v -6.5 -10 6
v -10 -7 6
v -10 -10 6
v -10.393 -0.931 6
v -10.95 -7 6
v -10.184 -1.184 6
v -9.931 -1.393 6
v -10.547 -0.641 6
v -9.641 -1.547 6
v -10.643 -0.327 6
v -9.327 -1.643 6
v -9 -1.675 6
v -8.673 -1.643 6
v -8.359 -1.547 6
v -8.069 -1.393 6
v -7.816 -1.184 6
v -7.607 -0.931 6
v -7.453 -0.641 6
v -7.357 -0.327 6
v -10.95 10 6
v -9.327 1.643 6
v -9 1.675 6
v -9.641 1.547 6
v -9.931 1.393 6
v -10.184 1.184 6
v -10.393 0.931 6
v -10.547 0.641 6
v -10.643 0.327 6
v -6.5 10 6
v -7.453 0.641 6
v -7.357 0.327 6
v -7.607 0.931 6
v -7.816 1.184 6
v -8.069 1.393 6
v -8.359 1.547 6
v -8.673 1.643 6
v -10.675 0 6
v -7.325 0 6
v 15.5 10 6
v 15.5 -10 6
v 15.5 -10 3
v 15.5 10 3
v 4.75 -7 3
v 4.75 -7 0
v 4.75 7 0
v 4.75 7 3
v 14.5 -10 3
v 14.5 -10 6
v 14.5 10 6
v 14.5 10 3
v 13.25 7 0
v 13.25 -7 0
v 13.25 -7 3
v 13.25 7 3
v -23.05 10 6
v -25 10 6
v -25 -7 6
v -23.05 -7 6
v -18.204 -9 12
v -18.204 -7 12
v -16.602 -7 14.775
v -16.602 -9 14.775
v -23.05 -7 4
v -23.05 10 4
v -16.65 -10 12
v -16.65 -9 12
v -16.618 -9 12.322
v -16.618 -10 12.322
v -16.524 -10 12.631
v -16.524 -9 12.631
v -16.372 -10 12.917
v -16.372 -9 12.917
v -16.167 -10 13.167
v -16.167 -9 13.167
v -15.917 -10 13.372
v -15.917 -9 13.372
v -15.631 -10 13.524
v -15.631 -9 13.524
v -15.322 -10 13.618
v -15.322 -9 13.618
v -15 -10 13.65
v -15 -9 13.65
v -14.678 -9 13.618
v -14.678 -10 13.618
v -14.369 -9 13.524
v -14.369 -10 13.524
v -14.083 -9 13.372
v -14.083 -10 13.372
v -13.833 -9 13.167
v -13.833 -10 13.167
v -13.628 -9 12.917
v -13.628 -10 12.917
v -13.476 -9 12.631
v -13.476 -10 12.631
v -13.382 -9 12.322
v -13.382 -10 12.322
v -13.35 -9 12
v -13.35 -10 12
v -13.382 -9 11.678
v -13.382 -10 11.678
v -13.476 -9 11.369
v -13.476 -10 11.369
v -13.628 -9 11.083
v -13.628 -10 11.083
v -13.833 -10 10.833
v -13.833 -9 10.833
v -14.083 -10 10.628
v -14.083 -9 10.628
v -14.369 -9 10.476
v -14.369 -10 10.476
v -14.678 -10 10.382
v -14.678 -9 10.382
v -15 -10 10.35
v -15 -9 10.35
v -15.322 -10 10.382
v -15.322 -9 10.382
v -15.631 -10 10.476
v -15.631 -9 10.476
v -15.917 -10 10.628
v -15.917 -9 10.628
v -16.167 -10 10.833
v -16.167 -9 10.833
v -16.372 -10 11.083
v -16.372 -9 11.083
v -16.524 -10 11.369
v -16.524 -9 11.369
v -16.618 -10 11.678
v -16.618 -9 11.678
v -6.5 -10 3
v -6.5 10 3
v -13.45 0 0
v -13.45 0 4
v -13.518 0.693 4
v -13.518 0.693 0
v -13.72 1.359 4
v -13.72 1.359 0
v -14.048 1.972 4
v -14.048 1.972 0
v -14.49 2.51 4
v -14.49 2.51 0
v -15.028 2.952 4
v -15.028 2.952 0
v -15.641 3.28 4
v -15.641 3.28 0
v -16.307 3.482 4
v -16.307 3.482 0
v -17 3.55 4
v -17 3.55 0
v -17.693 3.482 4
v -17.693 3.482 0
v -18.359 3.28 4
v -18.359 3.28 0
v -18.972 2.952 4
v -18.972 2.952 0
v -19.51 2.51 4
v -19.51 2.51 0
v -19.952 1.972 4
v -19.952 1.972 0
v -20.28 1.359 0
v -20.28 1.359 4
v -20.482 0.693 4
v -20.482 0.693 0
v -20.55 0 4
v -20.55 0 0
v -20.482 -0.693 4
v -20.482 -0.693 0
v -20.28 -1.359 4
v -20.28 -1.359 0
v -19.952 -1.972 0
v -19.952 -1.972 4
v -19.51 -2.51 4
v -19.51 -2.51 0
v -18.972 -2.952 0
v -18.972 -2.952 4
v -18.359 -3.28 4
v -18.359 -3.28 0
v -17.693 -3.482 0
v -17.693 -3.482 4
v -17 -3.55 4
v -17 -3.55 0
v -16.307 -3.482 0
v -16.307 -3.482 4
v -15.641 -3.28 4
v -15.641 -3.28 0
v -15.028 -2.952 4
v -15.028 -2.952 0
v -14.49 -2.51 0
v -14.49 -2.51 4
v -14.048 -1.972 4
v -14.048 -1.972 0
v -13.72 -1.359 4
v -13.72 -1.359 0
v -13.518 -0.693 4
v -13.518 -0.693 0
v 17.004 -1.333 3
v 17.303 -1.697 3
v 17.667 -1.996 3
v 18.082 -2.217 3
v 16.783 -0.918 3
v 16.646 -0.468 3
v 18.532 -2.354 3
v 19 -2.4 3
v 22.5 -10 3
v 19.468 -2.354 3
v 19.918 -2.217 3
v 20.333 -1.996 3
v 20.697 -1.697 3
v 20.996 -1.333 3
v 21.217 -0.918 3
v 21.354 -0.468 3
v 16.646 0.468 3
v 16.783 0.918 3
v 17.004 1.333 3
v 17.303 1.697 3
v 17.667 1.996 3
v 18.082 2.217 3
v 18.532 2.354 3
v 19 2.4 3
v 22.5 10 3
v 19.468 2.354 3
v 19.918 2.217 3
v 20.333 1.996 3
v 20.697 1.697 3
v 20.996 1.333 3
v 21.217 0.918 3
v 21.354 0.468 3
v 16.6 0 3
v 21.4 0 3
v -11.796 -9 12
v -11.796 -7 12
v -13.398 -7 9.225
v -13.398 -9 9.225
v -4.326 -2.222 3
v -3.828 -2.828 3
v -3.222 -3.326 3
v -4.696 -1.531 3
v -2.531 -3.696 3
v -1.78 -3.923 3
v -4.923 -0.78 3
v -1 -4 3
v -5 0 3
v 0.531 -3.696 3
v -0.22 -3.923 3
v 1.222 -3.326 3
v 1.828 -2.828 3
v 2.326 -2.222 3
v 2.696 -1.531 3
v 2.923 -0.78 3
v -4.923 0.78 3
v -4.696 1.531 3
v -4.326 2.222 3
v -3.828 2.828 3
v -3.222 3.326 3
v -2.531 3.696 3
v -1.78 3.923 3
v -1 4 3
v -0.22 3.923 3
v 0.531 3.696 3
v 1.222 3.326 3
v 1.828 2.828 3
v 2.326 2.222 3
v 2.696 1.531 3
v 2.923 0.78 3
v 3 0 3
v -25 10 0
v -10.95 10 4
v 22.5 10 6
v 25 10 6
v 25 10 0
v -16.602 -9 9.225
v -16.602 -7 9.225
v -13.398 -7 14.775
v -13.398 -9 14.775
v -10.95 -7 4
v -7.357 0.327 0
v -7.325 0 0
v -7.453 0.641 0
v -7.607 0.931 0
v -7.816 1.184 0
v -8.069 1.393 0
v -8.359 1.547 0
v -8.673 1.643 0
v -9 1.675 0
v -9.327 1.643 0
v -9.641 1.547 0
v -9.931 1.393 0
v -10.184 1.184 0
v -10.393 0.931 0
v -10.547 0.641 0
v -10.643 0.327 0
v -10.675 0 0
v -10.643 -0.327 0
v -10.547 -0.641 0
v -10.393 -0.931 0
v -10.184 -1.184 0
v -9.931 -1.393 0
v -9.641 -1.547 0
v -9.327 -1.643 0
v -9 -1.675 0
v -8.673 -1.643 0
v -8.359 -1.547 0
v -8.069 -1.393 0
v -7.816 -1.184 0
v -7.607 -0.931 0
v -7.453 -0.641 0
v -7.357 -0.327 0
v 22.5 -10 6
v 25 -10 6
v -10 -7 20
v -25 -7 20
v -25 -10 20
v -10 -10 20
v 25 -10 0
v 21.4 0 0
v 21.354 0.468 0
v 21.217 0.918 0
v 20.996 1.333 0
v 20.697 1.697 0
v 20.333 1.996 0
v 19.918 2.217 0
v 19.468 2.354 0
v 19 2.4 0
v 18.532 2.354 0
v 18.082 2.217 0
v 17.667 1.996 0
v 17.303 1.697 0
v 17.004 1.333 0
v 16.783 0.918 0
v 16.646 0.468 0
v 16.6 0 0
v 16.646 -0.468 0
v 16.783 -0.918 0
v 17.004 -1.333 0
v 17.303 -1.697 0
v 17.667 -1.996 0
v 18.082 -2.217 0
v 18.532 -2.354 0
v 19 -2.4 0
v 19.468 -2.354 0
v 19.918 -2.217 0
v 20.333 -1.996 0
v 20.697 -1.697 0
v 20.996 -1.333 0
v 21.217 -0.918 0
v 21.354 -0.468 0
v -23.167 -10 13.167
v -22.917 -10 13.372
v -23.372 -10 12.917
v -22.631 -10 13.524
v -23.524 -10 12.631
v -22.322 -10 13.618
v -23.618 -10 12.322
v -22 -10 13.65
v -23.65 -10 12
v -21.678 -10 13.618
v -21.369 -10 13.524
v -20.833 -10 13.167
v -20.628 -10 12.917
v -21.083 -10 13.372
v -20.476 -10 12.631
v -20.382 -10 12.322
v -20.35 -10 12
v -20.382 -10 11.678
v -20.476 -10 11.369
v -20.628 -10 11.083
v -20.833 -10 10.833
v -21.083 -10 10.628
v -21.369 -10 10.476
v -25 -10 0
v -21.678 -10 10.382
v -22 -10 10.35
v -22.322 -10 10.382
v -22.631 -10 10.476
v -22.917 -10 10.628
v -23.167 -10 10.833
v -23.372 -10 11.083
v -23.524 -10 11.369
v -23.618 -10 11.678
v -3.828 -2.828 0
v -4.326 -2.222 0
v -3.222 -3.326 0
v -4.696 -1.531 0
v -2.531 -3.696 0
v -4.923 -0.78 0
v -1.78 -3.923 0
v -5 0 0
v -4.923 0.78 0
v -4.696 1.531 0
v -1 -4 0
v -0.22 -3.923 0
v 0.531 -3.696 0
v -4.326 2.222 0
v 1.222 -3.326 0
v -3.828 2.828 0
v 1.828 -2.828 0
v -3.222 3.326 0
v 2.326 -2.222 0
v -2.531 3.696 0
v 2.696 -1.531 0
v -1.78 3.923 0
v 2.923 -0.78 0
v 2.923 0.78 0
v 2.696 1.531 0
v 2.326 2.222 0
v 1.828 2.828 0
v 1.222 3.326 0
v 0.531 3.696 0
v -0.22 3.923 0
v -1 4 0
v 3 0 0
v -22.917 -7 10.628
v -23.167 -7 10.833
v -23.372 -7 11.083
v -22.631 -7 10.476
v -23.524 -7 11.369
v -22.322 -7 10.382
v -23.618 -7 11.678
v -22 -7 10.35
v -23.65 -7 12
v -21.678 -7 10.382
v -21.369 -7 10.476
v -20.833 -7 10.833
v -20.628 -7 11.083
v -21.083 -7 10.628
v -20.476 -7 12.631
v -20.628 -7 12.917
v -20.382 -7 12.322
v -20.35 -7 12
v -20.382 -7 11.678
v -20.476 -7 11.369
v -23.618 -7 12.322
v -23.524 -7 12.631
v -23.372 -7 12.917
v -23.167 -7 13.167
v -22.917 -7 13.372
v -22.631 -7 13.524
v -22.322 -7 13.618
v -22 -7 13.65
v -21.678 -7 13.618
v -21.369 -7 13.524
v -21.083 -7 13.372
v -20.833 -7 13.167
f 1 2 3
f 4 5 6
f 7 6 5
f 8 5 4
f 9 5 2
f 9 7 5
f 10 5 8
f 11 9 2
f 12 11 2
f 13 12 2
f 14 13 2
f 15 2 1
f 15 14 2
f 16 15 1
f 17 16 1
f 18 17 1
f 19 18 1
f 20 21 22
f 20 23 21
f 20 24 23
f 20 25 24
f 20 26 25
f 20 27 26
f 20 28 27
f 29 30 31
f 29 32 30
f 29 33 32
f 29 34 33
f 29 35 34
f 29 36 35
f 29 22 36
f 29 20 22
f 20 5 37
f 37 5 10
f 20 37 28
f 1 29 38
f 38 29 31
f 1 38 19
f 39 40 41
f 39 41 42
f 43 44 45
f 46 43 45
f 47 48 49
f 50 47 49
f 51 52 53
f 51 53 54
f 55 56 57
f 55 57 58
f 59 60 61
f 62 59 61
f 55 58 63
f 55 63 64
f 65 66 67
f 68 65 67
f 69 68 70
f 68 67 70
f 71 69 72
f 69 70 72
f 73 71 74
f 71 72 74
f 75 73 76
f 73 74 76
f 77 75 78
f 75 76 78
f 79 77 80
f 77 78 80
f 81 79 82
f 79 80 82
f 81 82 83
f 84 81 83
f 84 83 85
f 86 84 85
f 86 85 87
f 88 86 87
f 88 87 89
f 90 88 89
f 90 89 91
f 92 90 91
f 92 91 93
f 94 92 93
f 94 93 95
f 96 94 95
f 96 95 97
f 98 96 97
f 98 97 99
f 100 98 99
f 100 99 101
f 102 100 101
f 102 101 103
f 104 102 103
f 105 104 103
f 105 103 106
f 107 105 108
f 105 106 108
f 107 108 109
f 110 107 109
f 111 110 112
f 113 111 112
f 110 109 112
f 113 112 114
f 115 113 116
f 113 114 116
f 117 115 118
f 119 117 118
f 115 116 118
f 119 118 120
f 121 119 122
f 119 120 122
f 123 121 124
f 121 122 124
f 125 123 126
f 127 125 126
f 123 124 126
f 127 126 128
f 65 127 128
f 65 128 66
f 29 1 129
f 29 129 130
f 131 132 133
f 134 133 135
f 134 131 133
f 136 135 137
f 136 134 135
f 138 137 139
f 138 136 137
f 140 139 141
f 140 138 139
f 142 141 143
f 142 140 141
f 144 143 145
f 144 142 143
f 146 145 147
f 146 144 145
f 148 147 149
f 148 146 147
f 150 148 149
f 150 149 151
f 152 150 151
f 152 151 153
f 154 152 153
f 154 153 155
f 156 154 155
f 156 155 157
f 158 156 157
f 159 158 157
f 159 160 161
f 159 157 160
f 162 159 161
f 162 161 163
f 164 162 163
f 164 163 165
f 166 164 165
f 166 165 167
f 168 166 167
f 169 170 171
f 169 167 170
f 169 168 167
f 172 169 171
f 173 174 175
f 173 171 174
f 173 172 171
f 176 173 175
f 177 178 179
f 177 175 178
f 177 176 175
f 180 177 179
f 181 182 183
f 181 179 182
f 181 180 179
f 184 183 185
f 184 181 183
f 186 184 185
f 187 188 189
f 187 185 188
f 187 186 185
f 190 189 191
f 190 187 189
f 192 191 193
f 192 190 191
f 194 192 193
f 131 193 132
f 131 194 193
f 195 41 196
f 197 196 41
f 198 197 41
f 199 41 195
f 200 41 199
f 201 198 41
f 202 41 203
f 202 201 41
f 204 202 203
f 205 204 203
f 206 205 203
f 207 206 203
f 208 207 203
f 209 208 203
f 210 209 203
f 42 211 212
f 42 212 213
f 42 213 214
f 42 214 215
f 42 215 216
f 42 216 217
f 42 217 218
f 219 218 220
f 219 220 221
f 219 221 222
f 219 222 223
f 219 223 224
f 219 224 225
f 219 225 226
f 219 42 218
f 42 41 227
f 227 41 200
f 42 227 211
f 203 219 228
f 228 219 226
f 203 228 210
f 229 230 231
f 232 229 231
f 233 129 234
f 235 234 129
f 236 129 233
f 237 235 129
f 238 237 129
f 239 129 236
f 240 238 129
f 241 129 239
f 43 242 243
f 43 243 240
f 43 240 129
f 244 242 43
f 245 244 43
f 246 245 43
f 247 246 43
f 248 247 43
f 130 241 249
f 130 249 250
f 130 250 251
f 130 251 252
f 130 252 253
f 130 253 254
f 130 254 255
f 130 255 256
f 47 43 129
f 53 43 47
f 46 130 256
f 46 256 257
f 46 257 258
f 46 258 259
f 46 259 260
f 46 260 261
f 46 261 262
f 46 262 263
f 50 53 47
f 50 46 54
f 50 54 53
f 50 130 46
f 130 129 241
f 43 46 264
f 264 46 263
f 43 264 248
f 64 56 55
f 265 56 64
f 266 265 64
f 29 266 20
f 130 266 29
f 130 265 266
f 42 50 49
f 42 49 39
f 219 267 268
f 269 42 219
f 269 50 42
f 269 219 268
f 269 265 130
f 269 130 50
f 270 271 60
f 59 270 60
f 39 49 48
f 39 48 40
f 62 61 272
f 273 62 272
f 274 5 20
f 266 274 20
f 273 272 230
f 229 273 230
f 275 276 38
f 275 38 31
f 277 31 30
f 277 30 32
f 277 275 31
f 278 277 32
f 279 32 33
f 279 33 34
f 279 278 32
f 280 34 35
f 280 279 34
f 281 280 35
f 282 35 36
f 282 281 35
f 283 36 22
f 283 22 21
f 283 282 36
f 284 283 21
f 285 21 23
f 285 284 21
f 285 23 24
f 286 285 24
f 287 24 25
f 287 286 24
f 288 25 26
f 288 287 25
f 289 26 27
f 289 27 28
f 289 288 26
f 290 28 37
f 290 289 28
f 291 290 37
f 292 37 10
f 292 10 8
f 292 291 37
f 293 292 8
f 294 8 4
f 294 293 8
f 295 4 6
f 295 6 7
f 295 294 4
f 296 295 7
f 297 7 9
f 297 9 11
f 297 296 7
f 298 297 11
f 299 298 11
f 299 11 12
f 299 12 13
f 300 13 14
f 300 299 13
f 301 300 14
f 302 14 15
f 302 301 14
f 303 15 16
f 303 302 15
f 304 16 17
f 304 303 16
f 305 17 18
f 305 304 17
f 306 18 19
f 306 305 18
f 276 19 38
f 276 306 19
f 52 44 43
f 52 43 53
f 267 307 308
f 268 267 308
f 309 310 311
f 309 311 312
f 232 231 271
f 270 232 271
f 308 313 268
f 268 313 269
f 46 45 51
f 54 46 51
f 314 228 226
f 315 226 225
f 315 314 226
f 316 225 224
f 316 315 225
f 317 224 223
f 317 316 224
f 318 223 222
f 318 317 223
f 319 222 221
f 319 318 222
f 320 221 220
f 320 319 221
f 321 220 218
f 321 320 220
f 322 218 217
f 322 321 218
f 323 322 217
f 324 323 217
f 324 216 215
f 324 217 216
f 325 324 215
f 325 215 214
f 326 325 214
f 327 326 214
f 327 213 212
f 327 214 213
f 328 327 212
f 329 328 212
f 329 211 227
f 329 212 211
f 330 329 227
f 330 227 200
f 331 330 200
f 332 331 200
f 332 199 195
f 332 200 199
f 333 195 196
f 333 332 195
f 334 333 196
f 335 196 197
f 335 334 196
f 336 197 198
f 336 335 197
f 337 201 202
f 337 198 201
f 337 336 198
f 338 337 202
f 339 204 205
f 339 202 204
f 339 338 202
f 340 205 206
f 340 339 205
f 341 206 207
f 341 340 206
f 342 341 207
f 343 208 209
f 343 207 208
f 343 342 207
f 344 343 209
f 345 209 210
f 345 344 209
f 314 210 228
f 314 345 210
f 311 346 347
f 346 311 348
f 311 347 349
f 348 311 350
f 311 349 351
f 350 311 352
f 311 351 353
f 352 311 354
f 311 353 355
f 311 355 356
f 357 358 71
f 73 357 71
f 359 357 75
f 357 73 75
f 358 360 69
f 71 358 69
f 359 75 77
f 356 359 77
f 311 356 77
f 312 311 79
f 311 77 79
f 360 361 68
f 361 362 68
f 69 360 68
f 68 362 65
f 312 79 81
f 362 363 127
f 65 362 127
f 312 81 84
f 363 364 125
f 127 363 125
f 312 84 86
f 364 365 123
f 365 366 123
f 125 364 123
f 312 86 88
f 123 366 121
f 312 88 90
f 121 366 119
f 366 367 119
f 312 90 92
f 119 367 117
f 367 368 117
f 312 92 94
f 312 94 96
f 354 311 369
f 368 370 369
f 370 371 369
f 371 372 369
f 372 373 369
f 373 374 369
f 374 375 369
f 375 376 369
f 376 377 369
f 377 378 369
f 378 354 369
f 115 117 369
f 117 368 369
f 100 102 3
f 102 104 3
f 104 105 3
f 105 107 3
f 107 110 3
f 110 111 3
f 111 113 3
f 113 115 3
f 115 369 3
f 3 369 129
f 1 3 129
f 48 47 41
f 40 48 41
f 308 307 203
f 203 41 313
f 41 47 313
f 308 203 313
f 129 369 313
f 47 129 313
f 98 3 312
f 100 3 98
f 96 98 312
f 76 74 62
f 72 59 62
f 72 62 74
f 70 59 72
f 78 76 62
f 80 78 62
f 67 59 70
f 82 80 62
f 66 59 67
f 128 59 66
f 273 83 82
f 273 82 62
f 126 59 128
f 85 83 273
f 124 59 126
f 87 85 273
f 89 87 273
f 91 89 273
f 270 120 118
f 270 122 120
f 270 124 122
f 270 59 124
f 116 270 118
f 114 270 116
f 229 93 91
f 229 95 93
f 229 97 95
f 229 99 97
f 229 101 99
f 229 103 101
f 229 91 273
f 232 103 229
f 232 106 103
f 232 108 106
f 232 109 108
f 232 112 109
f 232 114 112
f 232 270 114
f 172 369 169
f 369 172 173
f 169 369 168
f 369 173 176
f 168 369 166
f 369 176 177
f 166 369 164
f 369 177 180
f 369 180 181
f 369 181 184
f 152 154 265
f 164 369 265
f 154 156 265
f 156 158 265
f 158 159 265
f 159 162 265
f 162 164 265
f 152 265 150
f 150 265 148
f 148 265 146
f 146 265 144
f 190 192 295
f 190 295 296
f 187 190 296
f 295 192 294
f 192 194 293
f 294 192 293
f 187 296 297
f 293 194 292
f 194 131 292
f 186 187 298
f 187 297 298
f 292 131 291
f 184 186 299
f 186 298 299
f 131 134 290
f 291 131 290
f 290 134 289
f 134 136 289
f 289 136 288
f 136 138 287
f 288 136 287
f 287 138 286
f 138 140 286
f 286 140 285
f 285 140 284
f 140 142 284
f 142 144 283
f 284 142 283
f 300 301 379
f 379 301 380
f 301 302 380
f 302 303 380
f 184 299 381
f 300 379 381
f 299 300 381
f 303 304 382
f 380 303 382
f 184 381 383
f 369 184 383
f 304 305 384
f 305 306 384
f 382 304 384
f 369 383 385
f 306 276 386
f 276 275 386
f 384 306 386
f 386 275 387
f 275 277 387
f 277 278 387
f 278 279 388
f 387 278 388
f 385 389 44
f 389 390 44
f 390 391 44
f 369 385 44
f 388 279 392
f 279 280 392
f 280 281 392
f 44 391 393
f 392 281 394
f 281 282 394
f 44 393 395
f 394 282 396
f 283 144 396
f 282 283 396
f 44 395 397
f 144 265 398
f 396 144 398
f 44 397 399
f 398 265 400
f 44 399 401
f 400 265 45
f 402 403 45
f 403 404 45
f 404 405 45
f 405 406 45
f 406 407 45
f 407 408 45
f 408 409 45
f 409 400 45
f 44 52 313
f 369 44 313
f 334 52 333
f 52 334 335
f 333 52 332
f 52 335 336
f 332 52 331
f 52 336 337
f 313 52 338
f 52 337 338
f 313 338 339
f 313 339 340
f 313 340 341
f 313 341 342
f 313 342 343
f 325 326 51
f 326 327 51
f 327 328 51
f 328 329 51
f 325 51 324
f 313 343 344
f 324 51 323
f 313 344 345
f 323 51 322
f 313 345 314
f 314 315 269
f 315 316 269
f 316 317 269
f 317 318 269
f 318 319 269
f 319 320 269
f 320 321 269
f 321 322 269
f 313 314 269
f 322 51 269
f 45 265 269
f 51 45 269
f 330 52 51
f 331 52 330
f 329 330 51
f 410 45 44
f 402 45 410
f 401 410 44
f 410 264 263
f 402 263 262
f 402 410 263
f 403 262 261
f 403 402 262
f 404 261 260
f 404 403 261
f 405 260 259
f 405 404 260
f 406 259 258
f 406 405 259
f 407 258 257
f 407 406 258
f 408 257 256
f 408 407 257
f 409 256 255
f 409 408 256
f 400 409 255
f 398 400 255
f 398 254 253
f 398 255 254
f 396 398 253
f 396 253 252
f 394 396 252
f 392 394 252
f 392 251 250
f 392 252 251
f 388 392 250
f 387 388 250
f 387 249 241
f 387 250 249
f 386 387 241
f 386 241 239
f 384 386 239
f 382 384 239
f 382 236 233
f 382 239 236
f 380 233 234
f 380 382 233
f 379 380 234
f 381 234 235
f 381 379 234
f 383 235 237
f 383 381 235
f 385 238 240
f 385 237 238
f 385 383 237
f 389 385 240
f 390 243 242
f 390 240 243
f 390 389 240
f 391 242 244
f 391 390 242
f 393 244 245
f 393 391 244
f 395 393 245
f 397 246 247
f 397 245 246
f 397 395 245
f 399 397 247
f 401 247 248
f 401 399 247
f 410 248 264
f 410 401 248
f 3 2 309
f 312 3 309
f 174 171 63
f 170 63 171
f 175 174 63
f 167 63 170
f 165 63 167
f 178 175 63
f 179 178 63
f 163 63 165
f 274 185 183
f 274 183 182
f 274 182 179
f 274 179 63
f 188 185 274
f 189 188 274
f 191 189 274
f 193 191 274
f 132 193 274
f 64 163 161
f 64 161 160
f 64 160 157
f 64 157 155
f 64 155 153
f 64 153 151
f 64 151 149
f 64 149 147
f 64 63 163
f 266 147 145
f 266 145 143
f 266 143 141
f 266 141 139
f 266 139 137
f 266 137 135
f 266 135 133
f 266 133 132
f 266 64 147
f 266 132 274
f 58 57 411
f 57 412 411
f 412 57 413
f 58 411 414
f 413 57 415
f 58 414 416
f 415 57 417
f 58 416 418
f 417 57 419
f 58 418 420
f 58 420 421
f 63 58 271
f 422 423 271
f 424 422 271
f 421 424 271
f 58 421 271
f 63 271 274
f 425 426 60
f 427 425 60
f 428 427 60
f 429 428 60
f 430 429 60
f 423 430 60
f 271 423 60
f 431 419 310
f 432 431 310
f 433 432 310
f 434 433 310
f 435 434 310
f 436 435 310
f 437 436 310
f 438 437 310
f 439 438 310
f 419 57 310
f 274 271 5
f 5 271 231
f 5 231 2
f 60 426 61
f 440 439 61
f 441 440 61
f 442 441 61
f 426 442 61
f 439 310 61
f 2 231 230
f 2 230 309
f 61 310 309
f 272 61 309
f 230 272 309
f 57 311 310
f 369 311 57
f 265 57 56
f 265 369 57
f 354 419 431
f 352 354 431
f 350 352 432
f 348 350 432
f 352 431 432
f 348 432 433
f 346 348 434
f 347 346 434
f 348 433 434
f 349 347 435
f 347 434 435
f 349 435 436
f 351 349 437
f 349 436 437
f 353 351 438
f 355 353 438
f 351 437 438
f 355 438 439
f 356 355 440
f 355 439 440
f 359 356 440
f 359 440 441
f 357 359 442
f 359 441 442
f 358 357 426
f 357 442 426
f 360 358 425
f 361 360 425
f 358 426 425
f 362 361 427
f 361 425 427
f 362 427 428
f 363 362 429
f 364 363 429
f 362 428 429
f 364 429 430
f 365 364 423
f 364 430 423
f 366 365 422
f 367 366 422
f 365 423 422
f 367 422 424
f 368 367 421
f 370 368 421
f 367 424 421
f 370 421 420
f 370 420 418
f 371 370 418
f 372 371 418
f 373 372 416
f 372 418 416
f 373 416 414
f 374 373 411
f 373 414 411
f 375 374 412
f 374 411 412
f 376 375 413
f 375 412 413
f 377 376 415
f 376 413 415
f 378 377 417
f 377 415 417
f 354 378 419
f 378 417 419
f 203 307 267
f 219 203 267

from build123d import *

# Parameters (mm, degrees)
SKETCH1_W           = 50
SKETCH1_H           = 20
SKETCH1_R           = 3.55
SKETCH1_R_2         = 1.675
SKETCH1_R_3         = 4
SKETCH1_R_4         = 2.4
SKETCH1_W_2         = 8.5
SKETCH1_H_2         = 14
BOSS_EXTRUDE1_DEPTH = 6
SKETCH3_W           = 11
SKETCH3_H           = 20
CUT_EXTRUDE2_DEPTH  = 3
SKETCH4_W           = 12.1
SKETCH4_H           = 20
CUT_EXTRUDE4_DEPTH  = 2
BOSS_EXTRUDE3_START = -3
SKETCH6_W           = 15
SKETCH6_H           = 20
BOSS_EXTRUDE3_DEPTH = 3
SKETCH7_R           = 1.65
CUT_EXTRUDE5_DEPTH  = 3
CUT_EXTRUDE6_DEPTH  = 2
SKETCH10_W          = 7
SKETCH10_H          = 20
SKETCH10_W_2        = 10
CUT_EXTRUDE7_DEPTH  = 3


with BuildPart() as part:
    # Sketch1 → Boss-Extrude1 (new body)
    with BuildSketch(Plane.XY):
        Rectangle(SKETCH1_W, SKETCH1_H)
        with Locations((-17, 0)):
            Circle(SKETCH1_R, mode=Mode.SUBTRACT)
        with Locations((-9, 0)):
            Circle(SKETCH1_R_2, mode=Mode.SUBTRACT)
        with Locations((-1, 0)):
            Circle(SKETCH1_R_3, mode=Mode.SUBTRACT)
        with Locations((19, 0)):
            Circle(SKETCH1_R_4, mode=Mode.SUBTRACT)
        with Locations((9, 0)):
            Rectangle(SKETCH1_W_2, SKETCH1_H_2, mode=Mode.SUBTRACT)
    extrude(amount=BOSS_EXTRUDE1_DEPTH)

    # Sketch3 → Cut-Extrude2 (cut)
    with BuildSketch(Plane.XY.offset(6)):
        with Locations((9, 0)):
            Rectangle(SKETCH3_W, SKETCH3_H)
    extrude(amount=-CUT_EXTRUDE2_DEPTH, mode=Mode.SUBTRACT)

    # Sketch4 → Cut-Extrude4 (cut)
    with BuildSketch(Plane.XY.offset(6)):
        with Locations((-17, 0)):
            Rectangle(SKETCH4_W, SKETCH4_H)
    extrude(amount=-CUT_EXTRUDE4_DEPTH, mode=Mode.SUBTRACT)

    # Sketch6 → Boss-Extrude3 (add)
    with BuildSketch(Plane.XZ.offset(10).offset(BOSS_EXTRUDE3_START)):
        with Locations((-17.5, 10)):
            Rectangle(SKETCH6_W, SKETCH6_H)
    extrude(amount=BOSS_EXTRUDE3_DEPTH)

    # Sketch7 → Cut-Extrude5 (cut)
    with BuildSketch(Plane(origin=(0, -7, 0), x_dir=(1, 0, 0), z_dir=(0, 1, 0))):
        with Locations(Location((-22, -12, 0), (0, 0, 180))):
            Circle(SKETCH7_R)
        with Locations(Location((-15, -12, 0), (0, 0, 180))):
            Circle(SKETCH7_R)
    extrude(amount=-CUT_EXTRUDE5_DEPTH, mode=Mode.SUBTRACT)

    # Sketch8 → Cut-Extrude6 (cut)
    with BuildSketch(Plane(origin=(0, -7, 0), x_dir=(1, 0, 0), z_dir=(0, 1, 0))):
        Polygon((-13.397853003, -9.225), (-16.602146997, -9.225), (-18.204293994, -12), (-16.602146997, -14.775), (-13.397853003, -14.775), (-11.795706006, -12), align=None)
    extrude(amount=-CUT_EXTRUDE6_DEPTH, mode=Mode.SUBTRACT)

    # Sketch10 → Cut-Extrude7 (cut)
    with BuildSketch(Plane.XY.offset(6)):
        with Locations((19, 0)):
            Rectangle(SKETCH10_W, SKETCH10_H)
        with Locations((-1.5, 0)):
            Rectangle(SKETCH10_W_2, SKETCH10_H)
    extrude(amount=-CUT_EXTRUDE7_DEPTH, mode=Mode.SUBTRACT)


solid = part.part
